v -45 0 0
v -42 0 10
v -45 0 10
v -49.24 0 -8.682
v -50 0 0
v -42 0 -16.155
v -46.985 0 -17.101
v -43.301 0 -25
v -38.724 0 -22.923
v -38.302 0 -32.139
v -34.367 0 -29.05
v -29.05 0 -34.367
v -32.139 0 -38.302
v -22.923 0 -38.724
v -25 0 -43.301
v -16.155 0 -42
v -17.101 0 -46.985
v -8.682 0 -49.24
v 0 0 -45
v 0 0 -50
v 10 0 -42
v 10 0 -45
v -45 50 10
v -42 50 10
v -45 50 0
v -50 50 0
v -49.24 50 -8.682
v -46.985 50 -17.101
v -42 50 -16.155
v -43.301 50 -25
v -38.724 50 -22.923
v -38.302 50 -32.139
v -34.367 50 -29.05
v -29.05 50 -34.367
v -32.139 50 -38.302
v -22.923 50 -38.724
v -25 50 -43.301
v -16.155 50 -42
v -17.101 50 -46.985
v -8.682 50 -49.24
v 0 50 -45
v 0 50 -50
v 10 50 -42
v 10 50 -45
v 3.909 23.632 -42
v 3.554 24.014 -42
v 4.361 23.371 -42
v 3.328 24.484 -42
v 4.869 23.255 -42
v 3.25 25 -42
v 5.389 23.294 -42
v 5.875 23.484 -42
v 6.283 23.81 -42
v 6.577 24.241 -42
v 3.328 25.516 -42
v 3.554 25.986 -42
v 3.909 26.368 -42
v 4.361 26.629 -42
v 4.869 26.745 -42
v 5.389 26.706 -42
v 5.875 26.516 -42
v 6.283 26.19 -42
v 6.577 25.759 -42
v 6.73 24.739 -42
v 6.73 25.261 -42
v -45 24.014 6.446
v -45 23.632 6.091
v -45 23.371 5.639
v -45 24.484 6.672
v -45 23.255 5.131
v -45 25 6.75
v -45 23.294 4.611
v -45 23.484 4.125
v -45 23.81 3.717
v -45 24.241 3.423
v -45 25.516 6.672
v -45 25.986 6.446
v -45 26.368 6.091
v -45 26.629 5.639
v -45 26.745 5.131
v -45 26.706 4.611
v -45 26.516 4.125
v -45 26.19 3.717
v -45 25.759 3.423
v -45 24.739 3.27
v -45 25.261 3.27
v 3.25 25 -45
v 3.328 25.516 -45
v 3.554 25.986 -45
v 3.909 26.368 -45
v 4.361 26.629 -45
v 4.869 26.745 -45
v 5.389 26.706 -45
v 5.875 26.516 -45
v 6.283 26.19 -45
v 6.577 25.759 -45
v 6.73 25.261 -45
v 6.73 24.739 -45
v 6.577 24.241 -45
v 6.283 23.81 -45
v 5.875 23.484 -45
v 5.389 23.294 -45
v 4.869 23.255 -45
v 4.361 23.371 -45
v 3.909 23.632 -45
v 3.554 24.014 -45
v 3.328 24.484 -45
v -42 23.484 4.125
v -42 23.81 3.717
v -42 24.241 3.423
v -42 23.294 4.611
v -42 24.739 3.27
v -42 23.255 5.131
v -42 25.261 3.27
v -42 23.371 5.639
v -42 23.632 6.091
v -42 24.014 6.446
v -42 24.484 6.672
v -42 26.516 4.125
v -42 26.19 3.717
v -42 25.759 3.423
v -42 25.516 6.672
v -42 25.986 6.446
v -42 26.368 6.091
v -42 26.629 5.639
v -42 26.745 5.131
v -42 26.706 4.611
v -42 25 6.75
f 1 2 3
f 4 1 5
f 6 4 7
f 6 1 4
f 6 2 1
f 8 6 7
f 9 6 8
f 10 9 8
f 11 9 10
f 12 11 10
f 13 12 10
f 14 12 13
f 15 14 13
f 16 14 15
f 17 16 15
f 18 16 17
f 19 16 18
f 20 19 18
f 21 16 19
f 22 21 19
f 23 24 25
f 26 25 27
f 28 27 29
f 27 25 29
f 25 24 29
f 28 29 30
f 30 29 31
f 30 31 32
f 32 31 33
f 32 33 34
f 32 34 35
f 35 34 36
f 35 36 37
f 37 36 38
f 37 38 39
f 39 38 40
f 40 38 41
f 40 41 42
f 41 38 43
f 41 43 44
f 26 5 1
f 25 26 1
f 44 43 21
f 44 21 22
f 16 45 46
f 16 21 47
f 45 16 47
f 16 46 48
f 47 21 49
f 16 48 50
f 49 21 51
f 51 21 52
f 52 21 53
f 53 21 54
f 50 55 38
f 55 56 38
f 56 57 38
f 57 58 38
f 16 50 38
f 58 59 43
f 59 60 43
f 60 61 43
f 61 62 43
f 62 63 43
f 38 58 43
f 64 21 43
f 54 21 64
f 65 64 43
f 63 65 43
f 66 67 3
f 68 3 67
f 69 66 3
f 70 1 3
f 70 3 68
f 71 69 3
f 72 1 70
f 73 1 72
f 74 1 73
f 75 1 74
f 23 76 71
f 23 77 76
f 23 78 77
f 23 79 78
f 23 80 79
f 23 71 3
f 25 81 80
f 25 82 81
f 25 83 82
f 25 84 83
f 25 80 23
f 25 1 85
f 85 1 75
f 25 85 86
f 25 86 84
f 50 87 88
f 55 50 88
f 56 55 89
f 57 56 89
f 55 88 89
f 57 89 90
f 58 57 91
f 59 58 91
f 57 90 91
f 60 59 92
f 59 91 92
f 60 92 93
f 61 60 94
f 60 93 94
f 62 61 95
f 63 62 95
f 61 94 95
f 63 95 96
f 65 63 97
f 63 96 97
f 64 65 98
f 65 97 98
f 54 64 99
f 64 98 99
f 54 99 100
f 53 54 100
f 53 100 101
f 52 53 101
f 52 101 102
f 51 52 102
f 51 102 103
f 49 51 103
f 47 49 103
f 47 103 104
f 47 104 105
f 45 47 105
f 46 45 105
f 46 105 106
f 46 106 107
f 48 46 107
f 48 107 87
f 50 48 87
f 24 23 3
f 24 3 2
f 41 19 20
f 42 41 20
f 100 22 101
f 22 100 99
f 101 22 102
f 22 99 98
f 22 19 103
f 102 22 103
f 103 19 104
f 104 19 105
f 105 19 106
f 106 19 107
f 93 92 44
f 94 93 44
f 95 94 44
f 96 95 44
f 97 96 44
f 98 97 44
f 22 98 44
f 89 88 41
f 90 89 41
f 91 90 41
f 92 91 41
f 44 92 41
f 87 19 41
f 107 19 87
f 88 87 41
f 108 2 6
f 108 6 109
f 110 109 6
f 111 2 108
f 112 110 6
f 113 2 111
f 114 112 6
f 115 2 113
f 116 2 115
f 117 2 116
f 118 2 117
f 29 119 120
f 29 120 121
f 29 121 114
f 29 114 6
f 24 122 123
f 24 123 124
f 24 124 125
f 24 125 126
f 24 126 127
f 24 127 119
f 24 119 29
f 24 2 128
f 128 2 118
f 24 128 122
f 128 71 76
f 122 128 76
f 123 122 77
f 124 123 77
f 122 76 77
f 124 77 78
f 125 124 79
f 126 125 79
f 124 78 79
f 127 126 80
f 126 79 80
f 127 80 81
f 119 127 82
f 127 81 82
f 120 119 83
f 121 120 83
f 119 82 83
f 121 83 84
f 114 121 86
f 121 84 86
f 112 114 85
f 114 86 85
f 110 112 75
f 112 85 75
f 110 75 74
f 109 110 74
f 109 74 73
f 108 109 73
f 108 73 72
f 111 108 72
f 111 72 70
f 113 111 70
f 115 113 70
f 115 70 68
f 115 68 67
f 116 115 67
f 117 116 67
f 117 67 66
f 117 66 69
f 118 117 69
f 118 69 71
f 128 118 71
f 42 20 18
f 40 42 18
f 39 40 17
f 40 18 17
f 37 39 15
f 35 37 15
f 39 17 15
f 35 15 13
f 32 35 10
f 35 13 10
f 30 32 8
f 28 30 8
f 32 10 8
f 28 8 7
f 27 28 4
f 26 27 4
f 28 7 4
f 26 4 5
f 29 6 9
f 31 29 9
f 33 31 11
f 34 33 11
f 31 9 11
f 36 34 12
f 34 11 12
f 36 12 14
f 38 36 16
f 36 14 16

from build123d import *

# Parameters (mm, degrees)
BOSS_EXTRUDE1_DEPTH             = 50
SKETCH2_W                       = 3
SKETCH2_H                       = 50
BOSS_EXTRUDE2_DEPTH             = 10
BOSS_EXTRUDE2_DIRECTION_2_REACH = 88.603
SKETCH4_W                       = 3
SKETCH4_H                       = 50
BOSS_EXTRUDE3_DEPTH             = 10
BOSS_EXTRUDE3_DIRECTION_2_REACH = 88.603
SKETCH5_R                       = 1.75
CUT_EXTRUDE1_DEPTH              = 10
SKETCH6_R                       = 1.75
CUT_EXTRUDE2_DEPTH              = 10


with BuildPart() as part:
    # Sketch1 → Boss-Extrude1 (new body)
    with BuildSketch(Plane(origin=(0, 0, 0), x_dir=(1, 0, 0), z_dir=(0, 1, 0))):
        with BuildLine():
            Line((-50, 0), (-45, 0))
            ThreePointArc((-45, 0), (-31.819805153, 31.819805153), (0, 45))
            Line((0, 45), (0, 50))
            ThreePointArc((0, 50), (-35.355339059, 35.355339059), (-50, 0))
        make_face()
    extrude(amount=BOSS_EXTRUDE1_DEPTH)

    # Sketch2 → Boss-Extrude2 (add)
    with BuildSketch(Plane.XY):
        with Locations((-43.5, 25)):
            Rectangle(SKETCH2_W, SKETCH2_H)
    extrude(amount=BOSS_EXTRUDE2_DEPTH)

    # Sketch2 → Boss-Extrude2 direction 2 (add, up to next)
    with BuildSketch(Plane.XY, mode=Mode.PRIVATE) as boss_extrude2_direction_2_sk1:
        with Locations((-43.5, 25)):
            Rectangle(SKETCH2_W, SKETCH2_H)
    boss_extrude2_direction_2_tool1 = extrude(boss_extrude2_direction_2_sk1.sketch, amount=-BOSS_EXTRUDE2_DIRECTION_2_REACH, mode=Mode.PRIVATE) - part.part
    add(boss_extrude2_direction_2_tool1.solids().sort_by_distance((-43.5, 25, 0))[0])

    # Sketch4 → Boss-Extrude3 (add)
    with BuildSketch(Plane(origin=(0, 0, 0), x_dir=(0, 0, -1), z_dir=(1, 0, 0))):
        with Locations((43.5, 25)):
            Rectangle(SKETCH4_W, SKETCH4_H)
    extrude(amount=BOSS_EXTRUDE3_DEPTH)

    # Sketch4 → Boss-Extrude3 direction 2 (add, up to next)
    with BuildSketch(Plane(origin=(0, 0, 0), x_dir=(0, 0, -1), z_dir=(1, 0, 0)), mode=Mode.PRIVATE) as boss_extrude3_direction_2_sk1:
        with Locations((43.5, 25)):
            Rectangle(SKETCH4_W, SKETCH4_H)
    boss_extrude3_direction_2_tool1 = extrude(boss_extrude3_direction_2_sk1.sketch, amount=-BOSS_EXTRUDE3_DIRECTION_2_REACH, mode=Mode.PRIVATE) - part.part
    add(boss_extrude3_direction_2_tool1.solids().sort_by_distance((0, 25, -43.5))[0])

    # Sketch5 → Cut-Extrude1 (cut)
    with BuildSketch(Plane(origin=(0, 0, -45), x_dir=(-1, 0, 0), z_dir=(0, 0, -1))):
        with Locations((-5, 25)):
            Circle(SKETCH5_R)
    extrude(amount=-CUT_EXTRUDE1_DEPTH, mode=Mode.SUBTRACT)

    # Sketch6 → Cut-Extrude2 (cut)
    with BuildSketch(Plane.ZY.offset(45)):
        with Locations((5, 25)):
            Circle(SKETCH6_R)
    extrude(amount=-CUT_EXTRUDE2_DEPTH, mode=Mode.SUBTRACT)


solid = part.part
